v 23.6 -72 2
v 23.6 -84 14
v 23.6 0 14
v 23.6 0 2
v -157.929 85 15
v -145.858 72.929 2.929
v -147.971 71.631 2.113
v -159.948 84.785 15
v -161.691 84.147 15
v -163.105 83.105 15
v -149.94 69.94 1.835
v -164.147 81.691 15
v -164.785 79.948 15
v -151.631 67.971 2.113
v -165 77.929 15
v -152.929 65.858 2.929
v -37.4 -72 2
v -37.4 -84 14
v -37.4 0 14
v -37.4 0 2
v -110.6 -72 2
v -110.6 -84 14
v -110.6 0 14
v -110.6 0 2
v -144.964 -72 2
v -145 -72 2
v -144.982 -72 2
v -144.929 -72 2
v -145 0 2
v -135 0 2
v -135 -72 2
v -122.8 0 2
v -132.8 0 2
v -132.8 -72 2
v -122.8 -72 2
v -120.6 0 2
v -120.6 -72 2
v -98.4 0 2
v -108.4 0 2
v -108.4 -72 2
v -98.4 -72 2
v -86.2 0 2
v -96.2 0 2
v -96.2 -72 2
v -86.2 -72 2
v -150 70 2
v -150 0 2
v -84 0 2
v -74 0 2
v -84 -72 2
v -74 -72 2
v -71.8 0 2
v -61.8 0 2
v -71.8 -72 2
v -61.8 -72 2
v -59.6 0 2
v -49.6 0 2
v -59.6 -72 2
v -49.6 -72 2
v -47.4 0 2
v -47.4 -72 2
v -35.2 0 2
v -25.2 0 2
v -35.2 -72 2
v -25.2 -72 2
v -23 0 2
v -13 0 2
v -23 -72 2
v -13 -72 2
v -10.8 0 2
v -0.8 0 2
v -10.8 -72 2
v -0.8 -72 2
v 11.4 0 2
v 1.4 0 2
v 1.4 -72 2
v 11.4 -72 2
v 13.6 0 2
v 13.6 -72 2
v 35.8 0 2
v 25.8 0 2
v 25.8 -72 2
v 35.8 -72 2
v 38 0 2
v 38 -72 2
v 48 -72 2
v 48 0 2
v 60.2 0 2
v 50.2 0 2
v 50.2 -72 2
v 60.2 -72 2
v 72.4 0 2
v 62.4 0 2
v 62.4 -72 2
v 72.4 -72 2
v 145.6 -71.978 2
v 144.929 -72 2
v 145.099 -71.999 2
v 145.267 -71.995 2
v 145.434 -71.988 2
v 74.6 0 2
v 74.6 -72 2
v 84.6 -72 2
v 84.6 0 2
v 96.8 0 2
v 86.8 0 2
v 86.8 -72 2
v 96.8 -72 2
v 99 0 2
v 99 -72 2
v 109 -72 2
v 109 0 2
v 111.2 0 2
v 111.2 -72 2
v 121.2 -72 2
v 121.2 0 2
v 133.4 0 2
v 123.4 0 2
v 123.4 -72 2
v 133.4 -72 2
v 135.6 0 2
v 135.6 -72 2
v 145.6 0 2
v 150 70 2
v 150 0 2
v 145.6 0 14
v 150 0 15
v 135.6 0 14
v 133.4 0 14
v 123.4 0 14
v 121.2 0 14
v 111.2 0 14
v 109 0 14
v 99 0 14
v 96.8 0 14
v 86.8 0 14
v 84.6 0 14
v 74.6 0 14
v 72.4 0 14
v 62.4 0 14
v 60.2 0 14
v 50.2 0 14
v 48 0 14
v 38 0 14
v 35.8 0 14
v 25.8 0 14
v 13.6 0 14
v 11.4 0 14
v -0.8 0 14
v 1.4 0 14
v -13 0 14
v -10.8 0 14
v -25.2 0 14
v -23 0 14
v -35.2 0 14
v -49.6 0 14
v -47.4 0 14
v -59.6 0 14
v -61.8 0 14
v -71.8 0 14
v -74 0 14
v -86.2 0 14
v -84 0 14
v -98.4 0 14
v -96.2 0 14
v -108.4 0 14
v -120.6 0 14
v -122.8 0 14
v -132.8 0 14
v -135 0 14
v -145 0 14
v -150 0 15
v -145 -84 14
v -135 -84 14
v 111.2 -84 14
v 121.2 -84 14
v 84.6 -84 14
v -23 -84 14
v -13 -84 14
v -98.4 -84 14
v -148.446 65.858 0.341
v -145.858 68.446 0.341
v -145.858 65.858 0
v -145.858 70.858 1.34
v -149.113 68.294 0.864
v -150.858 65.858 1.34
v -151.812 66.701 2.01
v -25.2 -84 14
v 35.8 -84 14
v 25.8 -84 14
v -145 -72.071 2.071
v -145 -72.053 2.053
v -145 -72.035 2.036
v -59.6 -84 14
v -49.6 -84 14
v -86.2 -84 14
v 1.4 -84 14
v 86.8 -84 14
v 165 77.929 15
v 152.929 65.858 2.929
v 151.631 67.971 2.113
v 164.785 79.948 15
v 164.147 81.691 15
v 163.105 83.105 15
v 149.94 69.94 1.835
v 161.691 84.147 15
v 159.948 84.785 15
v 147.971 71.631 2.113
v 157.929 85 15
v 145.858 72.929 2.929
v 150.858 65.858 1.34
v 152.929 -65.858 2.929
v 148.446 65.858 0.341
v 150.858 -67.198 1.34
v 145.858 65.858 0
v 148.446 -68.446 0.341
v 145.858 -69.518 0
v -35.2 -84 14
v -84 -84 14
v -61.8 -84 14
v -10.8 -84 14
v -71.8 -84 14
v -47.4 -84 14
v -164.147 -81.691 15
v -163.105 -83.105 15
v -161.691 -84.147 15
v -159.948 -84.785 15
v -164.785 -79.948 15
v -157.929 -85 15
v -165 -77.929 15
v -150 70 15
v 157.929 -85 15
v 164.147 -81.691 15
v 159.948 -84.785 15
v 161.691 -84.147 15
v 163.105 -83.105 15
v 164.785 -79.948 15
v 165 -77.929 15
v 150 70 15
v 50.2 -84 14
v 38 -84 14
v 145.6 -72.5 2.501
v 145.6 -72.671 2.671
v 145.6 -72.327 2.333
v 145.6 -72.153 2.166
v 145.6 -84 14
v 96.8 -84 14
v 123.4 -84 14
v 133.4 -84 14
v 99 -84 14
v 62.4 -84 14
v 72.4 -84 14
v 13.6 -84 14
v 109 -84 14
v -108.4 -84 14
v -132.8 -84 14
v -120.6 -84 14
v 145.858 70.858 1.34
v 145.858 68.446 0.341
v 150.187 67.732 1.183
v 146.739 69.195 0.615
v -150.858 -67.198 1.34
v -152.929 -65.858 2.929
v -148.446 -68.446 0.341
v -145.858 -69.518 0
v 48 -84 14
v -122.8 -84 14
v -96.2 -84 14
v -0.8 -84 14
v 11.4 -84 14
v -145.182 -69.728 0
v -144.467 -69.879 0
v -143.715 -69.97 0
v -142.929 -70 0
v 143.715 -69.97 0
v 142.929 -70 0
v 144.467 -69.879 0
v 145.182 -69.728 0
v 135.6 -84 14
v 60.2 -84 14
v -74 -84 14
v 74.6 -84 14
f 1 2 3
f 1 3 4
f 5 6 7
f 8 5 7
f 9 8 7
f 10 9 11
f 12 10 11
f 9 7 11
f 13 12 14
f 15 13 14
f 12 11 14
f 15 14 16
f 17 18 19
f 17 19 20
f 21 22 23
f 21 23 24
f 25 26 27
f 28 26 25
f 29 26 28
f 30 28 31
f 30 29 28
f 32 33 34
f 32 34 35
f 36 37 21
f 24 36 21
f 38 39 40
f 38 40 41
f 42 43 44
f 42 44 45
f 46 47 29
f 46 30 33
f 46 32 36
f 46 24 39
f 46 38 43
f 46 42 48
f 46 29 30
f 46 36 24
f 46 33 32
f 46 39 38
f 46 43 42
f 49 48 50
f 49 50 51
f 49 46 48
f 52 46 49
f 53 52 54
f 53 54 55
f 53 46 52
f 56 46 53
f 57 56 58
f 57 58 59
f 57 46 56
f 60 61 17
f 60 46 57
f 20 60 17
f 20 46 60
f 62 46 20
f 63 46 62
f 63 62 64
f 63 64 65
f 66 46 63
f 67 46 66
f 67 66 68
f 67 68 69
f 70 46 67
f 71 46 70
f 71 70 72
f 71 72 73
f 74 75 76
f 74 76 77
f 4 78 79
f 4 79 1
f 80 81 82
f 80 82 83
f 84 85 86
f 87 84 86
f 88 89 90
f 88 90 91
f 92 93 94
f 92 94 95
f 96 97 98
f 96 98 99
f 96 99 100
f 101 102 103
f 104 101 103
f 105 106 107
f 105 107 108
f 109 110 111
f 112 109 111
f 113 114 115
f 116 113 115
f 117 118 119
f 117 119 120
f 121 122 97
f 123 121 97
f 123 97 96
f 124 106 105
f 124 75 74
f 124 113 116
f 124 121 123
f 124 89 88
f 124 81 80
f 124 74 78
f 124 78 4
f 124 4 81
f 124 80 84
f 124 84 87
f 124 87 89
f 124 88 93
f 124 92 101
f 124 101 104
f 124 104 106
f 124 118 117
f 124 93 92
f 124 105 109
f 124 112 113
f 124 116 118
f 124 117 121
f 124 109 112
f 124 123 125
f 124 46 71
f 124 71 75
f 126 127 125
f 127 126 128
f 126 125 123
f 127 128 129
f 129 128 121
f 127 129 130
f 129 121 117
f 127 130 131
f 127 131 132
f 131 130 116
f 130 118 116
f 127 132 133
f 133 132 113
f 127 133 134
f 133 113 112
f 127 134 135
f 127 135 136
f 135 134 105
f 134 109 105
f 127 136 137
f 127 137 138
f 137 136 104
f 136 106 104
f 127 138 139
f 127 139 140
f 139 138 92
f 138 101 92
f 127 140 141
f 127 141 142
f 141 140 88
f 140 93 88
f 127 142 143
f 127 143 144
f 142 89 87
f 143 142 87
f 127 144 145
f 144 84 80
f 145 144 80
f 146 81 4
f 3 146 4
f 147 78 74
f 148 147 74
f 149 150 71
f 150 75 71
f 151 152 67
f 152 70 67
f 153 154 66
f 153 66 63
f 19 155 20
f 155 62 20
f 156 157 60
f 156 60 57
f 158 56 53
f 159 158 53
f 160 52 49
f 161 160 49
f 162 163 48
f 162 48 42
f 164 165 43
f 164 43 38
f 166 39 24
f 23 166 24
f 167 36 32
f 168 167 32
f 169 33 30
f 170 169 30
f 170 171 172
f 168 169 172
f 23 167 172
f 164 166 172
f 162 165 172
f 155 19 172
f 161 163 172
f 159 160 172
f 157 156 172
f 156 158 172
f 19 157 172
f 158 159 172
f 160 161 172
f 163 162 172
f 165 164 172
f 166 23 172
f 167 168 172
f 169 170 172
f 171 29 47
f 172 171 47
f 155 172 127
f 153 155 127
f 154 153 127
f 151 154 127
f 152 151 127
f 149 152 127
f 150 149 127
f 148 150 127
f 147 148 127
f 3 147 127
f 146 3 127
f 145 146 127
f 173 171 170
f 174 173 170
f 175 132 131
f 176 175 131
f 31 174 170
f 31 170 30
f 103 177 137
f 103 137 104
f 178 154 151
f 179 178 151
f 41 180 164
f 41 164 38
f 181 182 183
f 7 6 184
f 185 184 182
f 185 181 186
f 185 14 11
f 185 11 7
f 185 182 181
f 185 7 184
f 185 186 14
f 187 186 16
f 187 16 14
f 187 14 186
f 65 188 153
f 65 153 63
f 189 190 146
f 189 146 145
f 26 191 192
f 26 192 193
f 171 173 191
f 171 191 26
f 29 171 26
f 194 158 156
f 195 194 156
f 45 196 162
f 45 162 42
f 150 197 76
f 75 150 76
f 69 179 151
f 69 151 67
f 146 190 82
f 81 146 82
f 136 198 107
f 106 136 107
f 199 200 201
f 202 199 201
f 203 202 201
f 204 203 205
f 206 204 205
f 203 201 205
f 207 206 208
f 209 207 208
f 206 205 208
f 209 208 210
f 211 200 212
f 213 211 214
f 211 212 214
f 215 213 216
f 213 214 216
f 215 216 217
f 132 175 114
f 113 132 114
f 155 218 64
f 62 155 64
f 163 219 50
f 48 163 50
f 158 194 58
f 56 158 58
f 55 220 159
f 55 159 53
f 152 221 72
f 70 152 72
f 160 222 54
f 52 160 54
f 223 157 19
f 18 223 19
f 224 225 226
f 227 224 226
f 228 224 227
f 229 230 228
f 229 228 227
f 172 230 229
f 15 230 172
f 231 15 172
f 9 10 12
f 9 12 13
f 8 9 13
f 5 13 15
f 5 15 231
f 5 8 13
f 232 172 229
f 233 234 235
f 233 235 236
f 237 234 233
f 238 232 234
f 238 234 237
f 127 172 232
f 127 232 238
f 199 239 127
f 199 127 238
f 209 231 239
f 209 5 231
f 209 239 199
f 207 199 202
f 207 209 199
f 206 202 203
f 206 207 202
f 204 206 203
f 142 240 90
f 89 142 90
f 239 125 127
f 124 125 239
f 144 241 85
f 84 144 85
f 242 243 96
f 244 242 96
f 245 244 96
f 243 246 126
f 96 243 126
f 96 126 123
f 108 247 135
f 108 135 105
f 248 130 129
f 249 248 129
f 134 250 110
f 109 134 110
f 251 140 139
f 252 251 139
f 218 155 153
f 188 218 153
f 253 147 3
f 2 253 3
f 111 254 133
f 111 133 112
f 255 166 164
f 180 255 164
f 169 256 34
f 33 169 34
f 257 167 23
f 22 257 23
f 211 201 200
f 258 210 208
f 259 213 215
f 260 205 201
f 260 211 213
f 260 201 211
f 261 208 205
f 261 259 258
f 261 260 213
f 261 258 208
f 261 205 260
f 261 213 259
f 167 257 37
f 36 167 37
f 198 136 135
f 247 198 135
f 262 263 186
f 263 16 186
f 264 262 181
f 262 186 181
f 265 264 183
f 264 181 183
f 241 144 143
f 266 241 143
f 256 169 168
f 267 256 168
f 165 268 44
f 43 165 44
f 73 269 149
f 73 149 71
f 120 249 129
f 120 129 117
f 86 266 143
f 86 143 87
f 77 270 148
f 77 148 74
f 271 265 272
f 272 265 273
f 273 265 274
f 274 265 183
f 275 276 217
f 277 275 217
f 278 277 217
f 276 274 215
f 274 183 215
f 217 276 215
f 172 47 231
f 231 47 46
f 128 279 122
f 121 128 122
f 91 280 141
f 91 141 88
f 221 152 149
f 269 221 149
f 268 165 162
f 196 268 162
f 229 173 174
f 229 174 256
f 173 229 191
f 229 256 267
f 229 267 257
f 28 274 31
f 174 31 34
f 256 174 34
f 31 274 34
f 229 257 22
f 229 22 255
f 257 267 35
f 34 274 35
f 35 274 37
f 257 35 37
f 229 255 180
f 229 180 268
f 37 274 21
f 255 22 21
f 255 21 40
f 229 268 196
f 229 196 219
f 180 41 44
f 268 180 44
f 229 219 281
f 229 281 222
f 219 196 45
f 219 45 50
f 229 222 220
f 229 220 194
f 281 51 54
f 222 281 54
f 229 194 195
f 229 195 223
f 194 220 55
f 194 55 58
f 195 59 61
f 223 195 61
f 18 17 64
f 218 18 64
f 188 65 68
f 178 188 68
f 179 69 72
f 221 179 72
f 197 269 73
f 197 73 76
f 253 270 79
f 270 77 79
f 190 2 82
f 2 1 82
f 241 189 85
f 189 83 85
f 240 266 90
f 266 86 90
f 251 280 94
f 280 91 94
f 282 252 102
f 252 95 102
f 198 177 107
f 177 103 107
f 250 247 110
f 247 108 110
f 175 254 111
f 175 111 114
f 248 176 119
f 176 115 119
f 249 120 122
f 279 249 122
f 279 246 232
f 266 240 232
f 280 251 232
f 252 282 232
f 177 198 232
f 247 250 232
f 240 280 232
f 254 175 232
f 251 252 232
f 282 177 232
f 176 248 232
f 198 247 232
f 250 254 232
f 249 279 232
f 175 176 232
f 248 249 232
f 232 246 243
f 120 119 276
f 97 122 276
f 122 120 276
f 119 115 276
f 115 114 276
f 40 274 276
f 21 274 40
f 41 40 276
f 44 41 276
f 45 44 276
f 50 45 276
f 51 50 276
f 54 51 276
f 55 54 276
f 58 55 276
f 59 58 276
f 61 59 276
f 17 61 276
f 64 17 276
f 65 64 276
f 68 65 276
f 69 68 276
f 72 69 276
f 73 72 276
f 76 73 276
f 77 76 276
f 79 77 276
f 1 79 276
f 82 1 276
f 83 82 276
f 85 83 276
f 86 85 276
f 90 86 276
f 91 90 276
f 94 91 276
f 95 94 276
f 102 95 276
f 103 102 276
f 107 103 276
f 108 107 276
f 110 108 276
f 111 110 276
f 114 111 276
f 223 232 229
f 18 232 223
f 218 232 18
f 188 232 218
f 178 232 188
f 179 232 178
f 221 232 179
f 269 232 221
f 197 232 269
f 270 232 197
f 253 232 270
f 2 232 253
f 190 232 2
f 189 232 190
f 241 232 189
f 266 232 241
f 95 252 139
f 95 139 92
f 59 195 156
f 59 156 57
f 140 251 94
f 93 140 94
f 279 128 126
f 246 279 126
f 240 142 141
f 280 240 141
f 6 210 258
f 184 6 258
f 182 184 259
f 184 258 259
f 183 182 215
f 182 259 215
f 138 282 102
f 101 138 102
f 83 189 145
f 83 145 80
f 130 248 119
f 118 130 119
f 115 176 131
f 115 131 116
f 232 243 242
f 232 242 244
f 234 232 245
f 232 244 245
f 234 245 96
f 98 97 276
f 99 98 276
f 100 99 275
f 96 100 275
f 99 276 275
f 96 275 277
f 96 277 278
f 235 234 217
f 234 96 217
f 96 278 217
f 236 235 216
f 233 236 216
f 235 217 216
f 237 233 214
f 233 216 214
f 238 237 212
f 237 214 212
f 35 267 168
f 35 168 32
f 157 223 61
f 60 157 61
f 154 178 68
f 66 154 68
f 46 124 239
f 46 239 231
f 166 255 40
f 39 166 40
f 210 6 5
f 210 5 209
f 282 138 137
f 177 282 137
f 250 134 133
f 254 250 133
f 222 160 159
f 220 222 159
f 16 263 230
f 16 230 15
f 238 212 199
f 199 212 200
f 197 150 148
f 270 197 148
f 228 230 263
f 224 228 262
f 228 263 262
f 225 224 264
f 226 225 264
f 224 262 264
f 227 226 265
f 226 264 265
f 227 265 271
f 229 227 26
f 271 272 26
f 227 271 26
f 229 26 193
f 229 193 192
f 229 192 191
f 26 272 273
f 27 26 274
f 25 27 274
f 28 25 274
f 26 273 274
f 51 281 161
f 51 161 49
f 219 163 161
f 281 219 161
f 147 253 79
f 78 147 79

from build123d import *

# Parameters (mm, degrees)
SZKIC1_W                    = 300
SZKIC1_H                    = 140
DODANIE_WYCI_GNI_CIE1_DEPTH = 15
DODANIE_WYCI_GNI_CIE1_DRAFT = -45
SZKIC2_W                    = 300
SZKIC2_H                    = 70
WYTNIJ_WYCI_GNI_CIE1_DEPTH  = 15
SZKIC3_W                    = 10
SZKIC3_H                    = 12
WYTNIJ_WYCI_GNI_CIE2_DEPTH  = 108
ZAOKR_GLENIE1_R             = 10


with BuildPart() as part:
    # Szkic1 → Dodanie-wyciągnięcie1 (with draft: the straight prism first)
    with BuildSketch(Plane.XY):
        Rectangle(SZKIC1_W, SZKIC1_H)
    extrude(amount=DODANIE_WYCI_GNI_CIE1_DEPTH)
    # Dodanie-wyciągnięcie1: the draft: its side faces are tilted about the plane it starts from
    dodanie_wyci_gni_cie1_sides = [part.faces().sort_by_distance(p)[0] for p in [
        (0, -70, 7.5),
        (150, 0, 7.5),
        (0, 70, 7.5),
        (-150, 0, 7.5),
    ]]
    draft(dodanie_wyci_gni_cie1_sides, Plane.XY, DODANIE_WYCI_GNI_CIE1_DRAFT)

    # Szkic2 → Wytnij-wyciągnięcie1 (cut)
    with BuildSketch(Plane(origin=(0, 0, 2), x_dir=(-1, 0, 0), z_dir=(0, 0, -1))):
        with Locations((0, 35)):
            Rectangle(SZKIC2_W, SZKIC2_H)
    extrude(amount=-WYTNIJ_WYCI_GNI_CIE1_DEPTH, mode=Mode.SUBTRACT)

    # Szkic3 → Wytnij-wyciągnięcie2 (cut)
    with BuildSketch(Plane(origin=(0, 0, 0), x_dir=(1, 0, 0), z_dir=(0, 1, 0))):
        with Locations((-140, -8)):
            Rectangle(SZKIC3_W, SZKIC3_H)
        with Locations((-127.8, -8)):
            Rectangle(SZKIC3_W, SZKIC3_H)
        with Locations((-115.6, -8)):
            Rectangle(SZKIC3_W, SZKIC3_H)
        with Locations((-103.4, -8)):
            Rectangle(SZKIC3_W, SZKIC3_H)
        with Locations((-91.2, -8)):
            Rectangle(SZKIC3_W, SZKIC3_H)
        with Locations((-79, -8)):
            Rectangle(SZKIC3_W, SZKIC3_H)
        with Locations((-66.8, -8)):
            Rectangle(SZKIC3_W, SZKIC3_H)
        with Locations((-54.6, -8)):
            Rectangle(SZKIC3_W, SZKIC3_H)
        with Locations((-42.4, -8)):
            Rectangle(SZKIC3_W, SZKIC3_H)
        with Locations((-30.2, -8)):
            Rectangle(SZKIC3_W, SZKIC3_H)
        with Locations((-18, -8)):
            Rectangle(SZKIC3_W, SZKIC3_H)
        with Locations((-5.8, -8)):
            Rectangle(SZKIC3_W, SZKIC3_H)
        with Locations((6.4, -8)):
            Rectangle(SZKIC3_W, SZKIC3_H)
        with Locations((18.6, -8)):
            Rectangle(SZKIC3_W, SZKIC3_H)
        with Locations((30.8, -8)):
            Rectangle(SZKIC3_W, SZKIC3_H)
        with Locations((43, -8)):
            Rectangle(SZKIC3_W, SZKIC3_H)
        with Locations((55.2, -8)):
            Rectangle(SZKIC3_W, SZKIC3_H)
        with Locations((67.4, -8)):
            Rectangle(SZKIC3_W, SZKIC3_H)
        with Locations((79.6, -8)):
            Rectangle(SZKIC3_W, SZKIC3_H)
        with Locations((91.8, -8)):
            Rectangle(SZKIC3_W, SZKIC3_H)
        with Locations((104, -8)):
            Rectangle(SZKIC3_W, SZKIC3_H)
        with Locations((116.2, -8)):
            Rectangle(SZKIC3_W, SZKIC3_H)
        with Locations((128.4, -8)):
            Rectangle(SZKIC3_W, SZKIC3_H)
        with Locations((140.6, -8)):
            Rectangle(SZKIC3_W, SZKIC3_H)
    extrude(amount=-WYTNIJ_WYCI_GNI_CIE2_DEPTH, mode=Mode.SUBTRACT)

    # Zaokrąglenie1
    # the kernel refuses this fillet: 10 mm, written as the material it takes off along each edge
    with BuildSketch(Plane(origin=(-145.857864376, 65.857864376, 10), x_dir=(-0.35740674433659364, 0.8628562094610169, 0.3574067443365923), z_dir=(-0.2705980500730978, 0.2705980500730978, -0.9238795325112871))) as zaokr_glenie1_piece_1_section:
        Polygon((-13.907299812, -13.907299812), (13.907299812, -13.907299812), (13.907299812, 13.907299812), (-13.907299812, 13.907299812), align=None)
    zaokr_glenie1_piece_1 = extrude(amount=13.907299812, mode=Mode.PRIVATE)
    zaokr_glenie1_piece_1 = split(zaokr_glenie1_piece_1, bisect_by=Plane(origin=(-145.857864376, 65.857864376, 10), z_dir=(0, 1, 0)), keep=Keep.TOP, mode=Mode.PRIVATE)
    zaokr_glenie1_piece_1 = split(zaokr_glenie1_piece_1, bisect_by=Plane(origin=(-145.857864376, 65.857864376, 10), z_dir=(-1, 0, 0)), keep=Keep.TOP, mode=Mode.PRIVATE)
    zaokr_glenie1_piece_1 = split(zaokr_glenie1_piece_1, bisect_by=Plane(origin=(-145.857864376, 65.857864376, 10), z_dir=(0.5773502691896265, -0.5773502691896265, -0.5773502691896244)), keep=Keep.TOP, mode=Mode.PRIVATE)
    zaokr_glenie1_piece_1 = split(zaokr_glenie1_piece_1, bisect_by=Plane(origin=(-152.928932188, 65.857864376, 2.928932188), z_dir=(0.7071067811865462, 0, 0.7071067811865488)), keep=Keep.TOP, mode=Mode.PRIVATE)
    zaokr_glenie1_piece_1 = split(zaokr_glenie1_piece_1, bisect_by=Plane(origin=(-145.857864376, 65.857864376, 0), z_dir=(0, 0, 1)), keep=Keep.TOP, mode=Mode.PRIVATE)
    zaokr_glenie1_piece_1 = split(zaokr_glenie1_piece_1, bisect_by=Plane(origin=(-145.857864376, 72.928932188, 2.928932188), z_dir=(0, -0.7071067811865462, 0.7071067811865488)), keep=Keep.TOP, mode=Mode.PRIVATE)
    zaokr_glenie1_piece_1 = zaokr_glenie1_piece_1 - Plane(origin=(-145.857864376, 65.857864376, 10), x_dir=(0.2705980500730978, -0.2705980500730978, 0.9238795325112871), z_dir=(-0.35740674433659364, 0.8628562094610169, 0.3574067443365923)) * Sphere(ZAOKR_GLENIE1_R, mode=Mode.PRIVATE)
    add(zaokr_glenie1_piece_1, mode=Mode.SUBTRACT)
    with BuildSketch(Plane(origin=(145.857864376, 65.857864376, 10), x_dir=(-0.7071067811865475, 0.7071067811865475, 0), z_dir=(0.2705980500730978, 0.2705980500730978, -0.9238795325112871))) as zaokr_glenie1_piece_2_section:
        Polygon((-13.907299812, -13.907299812), (13.907299812, -13.907299812), (13.907299812, 13.907299812), (-13.907299812, 13.907299812), align=None)
    zaokr_glenie1_piece_2 = extrude(amount=13.907299812, mode=Mode.PRIVATE)
    zaokr_glenie1_piece_2 = split(zaokr_glenie1_piece_2, bisect_by=Plane(origin=(145.857864376, 65.857864376, 10), z_dir=(0, 1, 0)), keep=Keep.TOP, mode=Mode.PRIVATE)
    zaokr_glenie1_piece_2 = split(zaokr_glenie1_piece_2, bisect_by=Plane(origin=(145.857864376, 65.857864376, 10), z_dir=(-0.5773502691896265, -0.5773502691896265, -0.5773502691896244)), keep=Keep.TOP, mode=Mode.PRIVATE)
    zaokr_glenie1_piece_2 = split(zaokr_glenie1_piece_2, bisect_by=Plane(origin=(145.857864376, 65.857864376, 10), z_dir=(1, 0, 0)), keep=Keep.TOP, mode=Mode.PRIVATE)
    zaokr_glenie1_piece_2 = split(zaokr_glenie1_piece_2, bisect_by=Plane(origin=(145.857864376, 65.857864376, 0), z_dir=(0, 0, 1)), keep=Keep.TOP, mode=Mode.PRIVATE)
    zaokr_glenie1_piece_2 = split(zaokr_glenie1_piece_2, bisect_by=Plane(origin=(152.928932188, 65.857864376, 2.928932188), z_dir=(-0.7071067811865462, 0, 0.7071067811865488)), keep=Keep.TOP, mode=Mode.PRIVATE)
    zaokr_glenie1_piece_2 = split(zaokr_glenie1_piece_2, bisect_by=Plane(origin=(145.857864376, 72.928932188, 2.928932188), z_dir=(0, -0.7071067811865462, 0.7071067811865488)), keep=Keep.TOP, mode=Mode.PRIVATE)
    zaokr_glenie1_piece_2 = zaokr_glenie1_piece_2 - Plane(origin=(145.857864376, 65.857864376, 10), x_dir=(-0.2705980500730978, -0.2705980500730978, 0.9238795325112871), z_dir=(-0.7071067811865475, 0.7071067811865475, 0)) * Sphere(ZAOKR_GLENIE1_R, mode=Mode.PRIVATE)
    add(zaokr_glenie1_piece_2, mode=Mode.SUBTRACT)
    with BuildSketch(Plane(origin=(-150, 65.857864376, 0), x_dir=(-0.7071067811865438, 0, 0.7071067811865511), z_dir=(0, -1, 0))) as zaokr_glenie1_piece_3:
        with BuildLine():
            CenterArc((ZAOKR_GLENIE1_R * 0.414213562373, -ZAOKR_GLENIE1_R), ZAOKR_GLENIE1_R, 90, 45)
            Line((-ZAOKR_GLENIE1_R * 0.292893218813, -ZAOKR_GLENIE1_R * 0.292893218813), (0, 0))
            Line((0, 0), (ZAOKR_GLENIE1_R * 0.414213562373, 0))
        make_face()
    extrude(amount=146.213203436, mode=Mode.SUBTRACT)
    with BuildSketch(Plane(origin=(145.857864376, 70, 0), x_dir=(0, -1, 0), z_dir=(-1, 0, 0))) as zaokr_glenie1_piece_4:
        with BuildLine():
            CenterArc((ZAOKR_GLENIE1_R * 0.414213562373, ZAOKR_GLENIE1_R), ZAOKR_GLENIE1_R, 225, 45)
            Line((-ZAOKR_GLENIE1_R * 0.292893218813, ZAOKR_GLENIE1_R * 0.292893218813), (0, 0))
            Line((0, 0), (ZAOKR_GLENIE1_R * 0.414213562373, 0))
        make_face()
    extrude(amount=291.715728753, mode=Mode.SUBTRACT)
    with BuildSketch(Plane(origin=(150, -80.355339059, 0), x_dir=(-1, 0, 0), z_dir=(0, 1, 0))) as zaokr_glenie1_piece_5:
        with BuildLine():
            CenterArc((ZAOKR_GLENIE1_R * 0.414213562373, ZAOKR_GLENIE1_R), ZAOKR_GLENIE1_R, 225, 45)
            Line((-ZAOKR_GLENIE1_R * 0.292893218813, ZAOKR_GLENIE1_R * 0.292893218813), (0, 0))
            Line((0, 0), (ZAOKR_GLENIE1_R * 0.414213562373, 0))
        make_face()
    extrude(amount=146.213203436, mode=Mode.SUBTRACT)
    with BuildSketch(Plane(origin=(141.666666667, -61.666666667, -8.333333333), x_dir=(-0.8164965809277256, -0.40824829046386363, 0.40824829046386335), z_dir=(0.5773502691896265, -0.5773502691896265, 0.5773502691896244))) as zaokr_glenie1_piece_6:
        with BuildLine():
            CenterArc((ZAOKR_GLENIE1_R * 0.57735026919, -ZAOKR_GLENIE1_R), ZAOKR_GLENIE1_R, 90, 60)
            Line((-ZAOKR_GLENIE1_R * 0.288675134595, -ZAOKR_GLENIE1_R * 0.5), (0, 0))
            Line((0, 0), (ZAOKR_GLENIE1_R * 0.57735026919, 0))
        make_face()
    extrude(amount=54.848275573, mode=Mode.SUBTRACT)
    with BuildSketch(Plane(origin=(-141.666666667, -61.666666667, -8.333333333), x_dir=(0.8164965809277256, -0.40824829046386546, 0.40824829046386146), z_dir=(-0.5773502691896265, -0.5773502691896265, 0.5773502691896244))) as zaokr_glenie1_piece_7:
        with BuildLine():
            CenterArc((ZAOKR_GLENIE1_R * 0.57735026919, ZAOKR_GLENIE1_R), ZAOKR_GLENIE1_R, 210, 60)
            Line((-ZAOKR_GLENIE1_R * 0.288675134595, ZAOKR_GLENIE1_R * 0.5), (0, 0))
            Line((0, 0), (ZAOKR_GLENIE1_R * 0.57735026919, 0))
        make_face()
    extrude(amount=54.848275573, mode=Mode.SUBTRACT)
    with BuildSketch(Plane(origin=(-150.571909584, 70.571909584, 0.571909584), x_dir=(-0.4082482904638678, -0.8164965809277256, 0.40824829046385913), z_dir=(-0.5773502691896265, 0.5773502691896265, 0.5773502691896244))) as zaokr_glenie1_piece_8:
        with BuildLine():
            CenterArc((ZAOKR_GLENIE1_R * 0.57735026919, ZAOKR_GLENIE1_R), ZAOKR_GLENIE1_R, 210, 60)
            Line((-ZAOKR_GLENIE1_R * 0.288675134595, ZAOKR_GLENIE1_R * 0.5), (0, 0))
            Line((0, 0), (ZAOKR_GLENIE1_R * 0.57735026919, 0))
        make_face()
    extrude(amount=39.423942386, mode=Mode.SUBTRACT)
    with BuildSketch(Plane(origin=(150.571909584, 70.571909584, 0.571909584), x_dir=(0.4082482904638637, -0.8164965809277256, 0.4082482904638634), z_dir=(0.5773502691896265, 0.5773502691896265, 0.5773502691896244))) as zaokr_glenie1_piece_9:
        with BuildLine():
            CenterArc((ZAOKR_GLENIE1_R * 0.57735026919, -ZAOKR_GLENIE1_R), ZAOKR_GLENIE1_R, 90, 60)
            Line((-ZAOKR_GLENIE1_R * 0.288675134595, -ZAOKR_GLENIE1_R * 0.5), (0, 0))
            Line((0, 0), (ZAOKR_GLENIE1_R * 0.57735026919, 0))
        make_face()
    extrude(amount=39.423942386, mode=Mode.SUBTRACT)


solid = part.part
